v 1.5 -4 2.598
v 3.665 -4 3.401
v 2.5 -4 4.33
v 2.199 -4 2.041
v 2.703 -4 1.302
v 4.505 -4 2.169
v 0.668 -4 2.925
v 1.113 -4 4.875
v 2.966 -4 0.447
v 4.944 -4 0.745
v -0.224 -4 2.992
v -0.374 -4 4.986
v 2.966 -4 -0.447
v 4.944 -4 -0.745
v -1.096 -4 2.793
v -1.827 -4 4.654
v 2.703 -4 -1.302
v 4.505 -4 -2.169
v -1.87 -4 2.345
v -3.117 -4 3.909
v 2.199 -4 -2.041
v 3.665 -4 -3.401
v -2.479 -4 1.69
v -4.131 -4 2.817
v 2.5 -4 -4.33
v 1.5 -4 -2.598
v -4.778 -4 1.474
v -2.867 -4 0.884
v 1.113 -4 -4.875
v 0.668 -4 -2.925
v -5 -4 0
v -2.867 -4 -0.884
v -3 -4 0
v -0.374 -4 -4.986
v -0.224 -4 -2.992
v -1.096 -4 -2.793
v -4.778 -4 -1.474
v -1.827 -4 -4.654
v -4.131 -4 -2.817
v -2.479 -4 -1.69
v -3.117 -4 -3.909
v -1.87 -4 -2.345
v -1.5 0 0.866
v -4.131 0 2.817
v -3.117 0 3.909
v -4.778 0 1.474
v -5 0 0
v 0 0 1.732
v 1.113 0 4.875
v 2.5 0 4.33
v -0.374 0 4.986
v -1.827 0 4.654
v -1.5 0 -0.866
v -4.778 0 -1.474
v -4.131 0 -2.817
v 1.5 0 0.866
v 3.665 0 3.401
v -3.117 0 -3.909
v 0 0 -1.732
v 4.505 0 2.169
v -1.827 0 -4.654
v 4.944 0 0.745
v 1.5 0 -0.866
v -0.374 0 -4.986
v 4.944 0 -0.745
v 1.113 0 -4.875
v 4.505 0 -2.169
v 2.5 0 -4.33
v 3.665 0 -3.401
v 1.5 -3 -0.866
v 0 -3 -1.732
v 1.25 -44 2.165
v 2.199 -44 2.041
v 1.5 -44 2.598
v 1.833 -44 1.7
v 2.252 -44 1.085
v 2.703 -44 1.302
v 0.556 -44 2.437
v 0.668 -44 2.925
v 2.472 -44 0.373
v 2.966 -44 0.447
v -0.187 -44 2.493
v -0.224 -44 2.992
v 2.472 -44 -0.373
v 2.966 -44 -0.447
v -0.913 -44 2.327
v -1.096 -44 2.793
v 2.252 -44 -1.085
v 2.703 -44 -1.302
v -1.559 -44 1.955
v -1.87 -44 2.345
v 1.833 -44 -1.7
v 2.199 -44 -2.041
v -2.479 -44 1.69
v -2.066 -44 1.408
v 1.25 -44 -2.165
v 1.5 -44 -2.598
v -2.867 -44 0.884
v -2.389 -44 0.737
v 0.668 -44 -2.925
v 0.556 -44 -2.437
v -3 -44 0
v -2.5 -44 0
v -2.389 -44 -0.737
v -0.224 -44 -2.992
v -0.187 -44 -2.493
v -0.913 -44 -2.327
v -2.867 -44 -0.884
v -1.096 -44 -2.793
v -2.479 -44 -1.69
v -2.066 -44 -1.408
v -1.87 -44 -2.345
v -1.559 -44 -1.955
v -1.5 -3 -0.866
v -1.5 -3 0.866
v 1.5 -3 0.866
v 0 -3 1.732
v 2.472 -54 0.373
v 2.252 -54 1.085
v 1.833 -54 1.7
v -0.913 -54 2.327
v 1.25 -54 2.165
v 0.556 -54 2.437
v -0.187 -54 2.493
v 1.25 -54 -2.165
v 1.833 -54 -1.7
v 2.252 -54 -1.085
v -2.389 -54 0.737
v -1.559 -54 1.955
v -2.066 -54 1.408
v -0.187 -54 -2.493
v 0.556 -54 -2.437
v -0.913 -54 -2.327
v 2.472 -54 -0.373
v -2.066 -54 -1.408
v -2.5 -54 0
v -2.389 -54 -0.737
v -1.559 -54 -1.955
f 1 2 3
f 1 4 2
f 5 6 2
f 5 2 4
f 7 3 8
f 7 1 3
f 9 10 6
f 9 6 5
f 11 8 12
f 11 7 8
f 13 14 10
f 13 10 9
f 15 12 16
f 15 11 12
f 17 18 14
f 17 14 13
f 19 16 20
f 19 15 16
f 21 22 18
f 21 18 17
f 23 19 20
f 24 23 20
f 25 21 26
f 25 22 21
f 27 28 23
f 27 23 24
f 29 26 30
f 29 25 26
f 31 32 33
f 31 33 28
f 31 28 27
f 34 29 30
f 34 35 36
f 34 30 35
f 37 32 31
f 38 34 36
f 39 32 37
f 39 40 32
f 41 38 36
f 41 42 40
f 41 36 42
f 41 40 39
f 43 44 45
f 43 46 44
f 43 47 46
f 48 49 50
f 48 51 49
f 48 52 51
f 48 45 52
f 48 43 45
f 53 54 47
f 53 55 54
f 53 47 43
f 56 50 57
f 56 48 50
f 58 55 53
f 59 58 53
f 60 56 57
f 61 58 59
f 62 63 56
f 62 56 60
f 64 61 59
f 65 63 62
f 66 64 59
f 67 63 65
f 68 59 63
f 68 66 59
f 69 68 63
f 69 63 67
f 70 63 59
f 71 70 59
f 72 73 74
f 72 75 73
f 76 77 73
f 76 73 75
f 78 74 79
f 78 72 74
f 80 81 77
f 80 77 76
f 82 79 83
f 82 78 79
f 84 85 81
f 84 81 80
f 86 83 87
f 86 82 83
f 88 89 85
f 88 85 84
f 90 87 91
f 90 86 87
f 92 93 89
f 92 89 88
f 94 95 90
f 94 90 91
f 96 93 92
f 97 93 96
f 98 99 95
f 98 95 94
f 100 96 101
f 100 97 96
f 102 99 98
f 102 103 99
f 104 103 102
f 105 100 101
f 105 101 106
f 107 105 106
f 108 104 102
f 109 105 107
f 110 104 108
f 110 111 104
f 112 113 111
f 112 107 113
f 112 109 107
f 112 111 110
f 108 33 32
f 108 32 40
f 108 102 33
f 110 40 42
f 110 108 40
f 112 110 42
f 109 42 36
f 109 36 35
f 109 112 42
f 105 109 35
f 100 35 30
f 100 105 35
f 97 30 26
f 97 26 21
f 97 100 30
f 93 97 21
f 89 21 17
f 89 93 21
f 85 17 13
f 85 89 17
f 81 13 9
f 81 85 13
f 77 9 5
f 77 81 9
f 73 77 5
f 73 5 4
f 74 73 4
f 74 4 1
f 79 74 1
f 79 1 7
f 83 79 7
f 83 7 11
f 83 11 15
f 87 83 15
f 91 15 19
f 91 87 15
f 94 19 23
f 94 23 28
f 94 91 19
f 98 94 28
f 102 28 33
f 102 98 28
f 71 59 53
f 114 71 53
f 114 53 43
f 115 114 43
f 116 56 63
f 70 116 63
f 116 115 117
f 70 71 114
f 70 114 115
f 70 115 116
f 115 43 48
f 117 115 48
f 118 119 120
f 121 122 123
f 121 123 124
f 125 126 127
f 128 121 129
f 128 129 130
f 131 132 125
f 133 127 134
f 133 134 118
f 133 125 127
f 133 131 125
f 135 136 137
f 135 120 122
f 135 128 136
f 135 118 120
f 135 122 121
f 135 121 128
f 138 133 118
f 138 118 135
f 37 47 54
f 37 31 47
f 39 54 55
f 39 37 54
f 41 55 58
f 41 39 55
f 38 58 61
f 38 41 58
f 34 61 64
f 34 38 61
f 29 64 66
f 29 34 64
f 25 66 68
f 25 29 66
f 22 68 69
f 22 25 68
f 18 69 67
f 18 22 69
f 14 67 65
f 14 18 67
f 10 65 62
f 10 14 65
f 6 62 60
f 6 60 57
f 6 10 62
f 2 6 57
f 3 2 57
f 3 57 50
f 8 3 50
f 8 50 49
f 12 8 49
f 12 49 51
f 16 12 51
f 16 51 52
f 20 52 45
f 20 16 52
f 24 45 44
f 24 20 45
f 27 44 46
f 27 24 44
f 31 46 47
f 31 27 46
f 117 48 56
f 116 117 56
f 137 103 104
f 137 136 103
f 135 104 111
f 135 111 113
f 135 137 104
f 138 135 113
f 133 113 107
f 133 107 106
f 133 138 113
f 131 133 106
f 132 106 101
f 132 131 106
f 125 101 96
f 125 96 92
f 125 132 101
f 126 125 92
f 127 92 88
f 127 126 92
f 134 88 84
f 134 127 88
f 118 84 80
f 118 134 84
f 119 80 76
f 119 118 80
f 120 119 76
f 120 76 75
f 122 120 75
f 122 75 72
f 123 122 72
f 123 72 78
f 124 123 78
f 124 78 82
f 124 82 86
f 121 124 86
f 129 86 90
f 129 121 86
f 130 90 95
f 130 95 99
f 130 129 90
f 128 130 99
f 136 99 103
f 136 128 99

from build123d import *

# Parameters (mm, degrees)
CUT_EXTRUDE2_DEPTH = 3


with BuildPart() as part:
    # Sketch3 → Revolve2 (revolve)
    with BuildSketch(Plane.XY):
        Polygon((0, 0), (-5, 0), (-5, -4), (-3, -4), (-3, -44), (-2.5, -44), (-2.5, -54), (0, -54), align=None)
    revolve(axis=Axis((0, 0, 0), (0, -1, 0)))

    # Sketch4 → Cut-Extrude2 (cut)
    with BuildSketch(Plane(origin=(0, 0, 0), x_dir=(1, 0, 0), z_dir=(0, 1, 0))):
        Polygon((1.5, 0.866025404), (0, 1.732050808), (-1.5, 0.866025404), (-1.5, -0.866025404), (0, -1.732050808), (1.5, -0.866025404), align=None)
    extrude(amount=-CUT_EXTRUDE2_DEPTH, mode=Mode.SUBTRACT)


solid = part.part
